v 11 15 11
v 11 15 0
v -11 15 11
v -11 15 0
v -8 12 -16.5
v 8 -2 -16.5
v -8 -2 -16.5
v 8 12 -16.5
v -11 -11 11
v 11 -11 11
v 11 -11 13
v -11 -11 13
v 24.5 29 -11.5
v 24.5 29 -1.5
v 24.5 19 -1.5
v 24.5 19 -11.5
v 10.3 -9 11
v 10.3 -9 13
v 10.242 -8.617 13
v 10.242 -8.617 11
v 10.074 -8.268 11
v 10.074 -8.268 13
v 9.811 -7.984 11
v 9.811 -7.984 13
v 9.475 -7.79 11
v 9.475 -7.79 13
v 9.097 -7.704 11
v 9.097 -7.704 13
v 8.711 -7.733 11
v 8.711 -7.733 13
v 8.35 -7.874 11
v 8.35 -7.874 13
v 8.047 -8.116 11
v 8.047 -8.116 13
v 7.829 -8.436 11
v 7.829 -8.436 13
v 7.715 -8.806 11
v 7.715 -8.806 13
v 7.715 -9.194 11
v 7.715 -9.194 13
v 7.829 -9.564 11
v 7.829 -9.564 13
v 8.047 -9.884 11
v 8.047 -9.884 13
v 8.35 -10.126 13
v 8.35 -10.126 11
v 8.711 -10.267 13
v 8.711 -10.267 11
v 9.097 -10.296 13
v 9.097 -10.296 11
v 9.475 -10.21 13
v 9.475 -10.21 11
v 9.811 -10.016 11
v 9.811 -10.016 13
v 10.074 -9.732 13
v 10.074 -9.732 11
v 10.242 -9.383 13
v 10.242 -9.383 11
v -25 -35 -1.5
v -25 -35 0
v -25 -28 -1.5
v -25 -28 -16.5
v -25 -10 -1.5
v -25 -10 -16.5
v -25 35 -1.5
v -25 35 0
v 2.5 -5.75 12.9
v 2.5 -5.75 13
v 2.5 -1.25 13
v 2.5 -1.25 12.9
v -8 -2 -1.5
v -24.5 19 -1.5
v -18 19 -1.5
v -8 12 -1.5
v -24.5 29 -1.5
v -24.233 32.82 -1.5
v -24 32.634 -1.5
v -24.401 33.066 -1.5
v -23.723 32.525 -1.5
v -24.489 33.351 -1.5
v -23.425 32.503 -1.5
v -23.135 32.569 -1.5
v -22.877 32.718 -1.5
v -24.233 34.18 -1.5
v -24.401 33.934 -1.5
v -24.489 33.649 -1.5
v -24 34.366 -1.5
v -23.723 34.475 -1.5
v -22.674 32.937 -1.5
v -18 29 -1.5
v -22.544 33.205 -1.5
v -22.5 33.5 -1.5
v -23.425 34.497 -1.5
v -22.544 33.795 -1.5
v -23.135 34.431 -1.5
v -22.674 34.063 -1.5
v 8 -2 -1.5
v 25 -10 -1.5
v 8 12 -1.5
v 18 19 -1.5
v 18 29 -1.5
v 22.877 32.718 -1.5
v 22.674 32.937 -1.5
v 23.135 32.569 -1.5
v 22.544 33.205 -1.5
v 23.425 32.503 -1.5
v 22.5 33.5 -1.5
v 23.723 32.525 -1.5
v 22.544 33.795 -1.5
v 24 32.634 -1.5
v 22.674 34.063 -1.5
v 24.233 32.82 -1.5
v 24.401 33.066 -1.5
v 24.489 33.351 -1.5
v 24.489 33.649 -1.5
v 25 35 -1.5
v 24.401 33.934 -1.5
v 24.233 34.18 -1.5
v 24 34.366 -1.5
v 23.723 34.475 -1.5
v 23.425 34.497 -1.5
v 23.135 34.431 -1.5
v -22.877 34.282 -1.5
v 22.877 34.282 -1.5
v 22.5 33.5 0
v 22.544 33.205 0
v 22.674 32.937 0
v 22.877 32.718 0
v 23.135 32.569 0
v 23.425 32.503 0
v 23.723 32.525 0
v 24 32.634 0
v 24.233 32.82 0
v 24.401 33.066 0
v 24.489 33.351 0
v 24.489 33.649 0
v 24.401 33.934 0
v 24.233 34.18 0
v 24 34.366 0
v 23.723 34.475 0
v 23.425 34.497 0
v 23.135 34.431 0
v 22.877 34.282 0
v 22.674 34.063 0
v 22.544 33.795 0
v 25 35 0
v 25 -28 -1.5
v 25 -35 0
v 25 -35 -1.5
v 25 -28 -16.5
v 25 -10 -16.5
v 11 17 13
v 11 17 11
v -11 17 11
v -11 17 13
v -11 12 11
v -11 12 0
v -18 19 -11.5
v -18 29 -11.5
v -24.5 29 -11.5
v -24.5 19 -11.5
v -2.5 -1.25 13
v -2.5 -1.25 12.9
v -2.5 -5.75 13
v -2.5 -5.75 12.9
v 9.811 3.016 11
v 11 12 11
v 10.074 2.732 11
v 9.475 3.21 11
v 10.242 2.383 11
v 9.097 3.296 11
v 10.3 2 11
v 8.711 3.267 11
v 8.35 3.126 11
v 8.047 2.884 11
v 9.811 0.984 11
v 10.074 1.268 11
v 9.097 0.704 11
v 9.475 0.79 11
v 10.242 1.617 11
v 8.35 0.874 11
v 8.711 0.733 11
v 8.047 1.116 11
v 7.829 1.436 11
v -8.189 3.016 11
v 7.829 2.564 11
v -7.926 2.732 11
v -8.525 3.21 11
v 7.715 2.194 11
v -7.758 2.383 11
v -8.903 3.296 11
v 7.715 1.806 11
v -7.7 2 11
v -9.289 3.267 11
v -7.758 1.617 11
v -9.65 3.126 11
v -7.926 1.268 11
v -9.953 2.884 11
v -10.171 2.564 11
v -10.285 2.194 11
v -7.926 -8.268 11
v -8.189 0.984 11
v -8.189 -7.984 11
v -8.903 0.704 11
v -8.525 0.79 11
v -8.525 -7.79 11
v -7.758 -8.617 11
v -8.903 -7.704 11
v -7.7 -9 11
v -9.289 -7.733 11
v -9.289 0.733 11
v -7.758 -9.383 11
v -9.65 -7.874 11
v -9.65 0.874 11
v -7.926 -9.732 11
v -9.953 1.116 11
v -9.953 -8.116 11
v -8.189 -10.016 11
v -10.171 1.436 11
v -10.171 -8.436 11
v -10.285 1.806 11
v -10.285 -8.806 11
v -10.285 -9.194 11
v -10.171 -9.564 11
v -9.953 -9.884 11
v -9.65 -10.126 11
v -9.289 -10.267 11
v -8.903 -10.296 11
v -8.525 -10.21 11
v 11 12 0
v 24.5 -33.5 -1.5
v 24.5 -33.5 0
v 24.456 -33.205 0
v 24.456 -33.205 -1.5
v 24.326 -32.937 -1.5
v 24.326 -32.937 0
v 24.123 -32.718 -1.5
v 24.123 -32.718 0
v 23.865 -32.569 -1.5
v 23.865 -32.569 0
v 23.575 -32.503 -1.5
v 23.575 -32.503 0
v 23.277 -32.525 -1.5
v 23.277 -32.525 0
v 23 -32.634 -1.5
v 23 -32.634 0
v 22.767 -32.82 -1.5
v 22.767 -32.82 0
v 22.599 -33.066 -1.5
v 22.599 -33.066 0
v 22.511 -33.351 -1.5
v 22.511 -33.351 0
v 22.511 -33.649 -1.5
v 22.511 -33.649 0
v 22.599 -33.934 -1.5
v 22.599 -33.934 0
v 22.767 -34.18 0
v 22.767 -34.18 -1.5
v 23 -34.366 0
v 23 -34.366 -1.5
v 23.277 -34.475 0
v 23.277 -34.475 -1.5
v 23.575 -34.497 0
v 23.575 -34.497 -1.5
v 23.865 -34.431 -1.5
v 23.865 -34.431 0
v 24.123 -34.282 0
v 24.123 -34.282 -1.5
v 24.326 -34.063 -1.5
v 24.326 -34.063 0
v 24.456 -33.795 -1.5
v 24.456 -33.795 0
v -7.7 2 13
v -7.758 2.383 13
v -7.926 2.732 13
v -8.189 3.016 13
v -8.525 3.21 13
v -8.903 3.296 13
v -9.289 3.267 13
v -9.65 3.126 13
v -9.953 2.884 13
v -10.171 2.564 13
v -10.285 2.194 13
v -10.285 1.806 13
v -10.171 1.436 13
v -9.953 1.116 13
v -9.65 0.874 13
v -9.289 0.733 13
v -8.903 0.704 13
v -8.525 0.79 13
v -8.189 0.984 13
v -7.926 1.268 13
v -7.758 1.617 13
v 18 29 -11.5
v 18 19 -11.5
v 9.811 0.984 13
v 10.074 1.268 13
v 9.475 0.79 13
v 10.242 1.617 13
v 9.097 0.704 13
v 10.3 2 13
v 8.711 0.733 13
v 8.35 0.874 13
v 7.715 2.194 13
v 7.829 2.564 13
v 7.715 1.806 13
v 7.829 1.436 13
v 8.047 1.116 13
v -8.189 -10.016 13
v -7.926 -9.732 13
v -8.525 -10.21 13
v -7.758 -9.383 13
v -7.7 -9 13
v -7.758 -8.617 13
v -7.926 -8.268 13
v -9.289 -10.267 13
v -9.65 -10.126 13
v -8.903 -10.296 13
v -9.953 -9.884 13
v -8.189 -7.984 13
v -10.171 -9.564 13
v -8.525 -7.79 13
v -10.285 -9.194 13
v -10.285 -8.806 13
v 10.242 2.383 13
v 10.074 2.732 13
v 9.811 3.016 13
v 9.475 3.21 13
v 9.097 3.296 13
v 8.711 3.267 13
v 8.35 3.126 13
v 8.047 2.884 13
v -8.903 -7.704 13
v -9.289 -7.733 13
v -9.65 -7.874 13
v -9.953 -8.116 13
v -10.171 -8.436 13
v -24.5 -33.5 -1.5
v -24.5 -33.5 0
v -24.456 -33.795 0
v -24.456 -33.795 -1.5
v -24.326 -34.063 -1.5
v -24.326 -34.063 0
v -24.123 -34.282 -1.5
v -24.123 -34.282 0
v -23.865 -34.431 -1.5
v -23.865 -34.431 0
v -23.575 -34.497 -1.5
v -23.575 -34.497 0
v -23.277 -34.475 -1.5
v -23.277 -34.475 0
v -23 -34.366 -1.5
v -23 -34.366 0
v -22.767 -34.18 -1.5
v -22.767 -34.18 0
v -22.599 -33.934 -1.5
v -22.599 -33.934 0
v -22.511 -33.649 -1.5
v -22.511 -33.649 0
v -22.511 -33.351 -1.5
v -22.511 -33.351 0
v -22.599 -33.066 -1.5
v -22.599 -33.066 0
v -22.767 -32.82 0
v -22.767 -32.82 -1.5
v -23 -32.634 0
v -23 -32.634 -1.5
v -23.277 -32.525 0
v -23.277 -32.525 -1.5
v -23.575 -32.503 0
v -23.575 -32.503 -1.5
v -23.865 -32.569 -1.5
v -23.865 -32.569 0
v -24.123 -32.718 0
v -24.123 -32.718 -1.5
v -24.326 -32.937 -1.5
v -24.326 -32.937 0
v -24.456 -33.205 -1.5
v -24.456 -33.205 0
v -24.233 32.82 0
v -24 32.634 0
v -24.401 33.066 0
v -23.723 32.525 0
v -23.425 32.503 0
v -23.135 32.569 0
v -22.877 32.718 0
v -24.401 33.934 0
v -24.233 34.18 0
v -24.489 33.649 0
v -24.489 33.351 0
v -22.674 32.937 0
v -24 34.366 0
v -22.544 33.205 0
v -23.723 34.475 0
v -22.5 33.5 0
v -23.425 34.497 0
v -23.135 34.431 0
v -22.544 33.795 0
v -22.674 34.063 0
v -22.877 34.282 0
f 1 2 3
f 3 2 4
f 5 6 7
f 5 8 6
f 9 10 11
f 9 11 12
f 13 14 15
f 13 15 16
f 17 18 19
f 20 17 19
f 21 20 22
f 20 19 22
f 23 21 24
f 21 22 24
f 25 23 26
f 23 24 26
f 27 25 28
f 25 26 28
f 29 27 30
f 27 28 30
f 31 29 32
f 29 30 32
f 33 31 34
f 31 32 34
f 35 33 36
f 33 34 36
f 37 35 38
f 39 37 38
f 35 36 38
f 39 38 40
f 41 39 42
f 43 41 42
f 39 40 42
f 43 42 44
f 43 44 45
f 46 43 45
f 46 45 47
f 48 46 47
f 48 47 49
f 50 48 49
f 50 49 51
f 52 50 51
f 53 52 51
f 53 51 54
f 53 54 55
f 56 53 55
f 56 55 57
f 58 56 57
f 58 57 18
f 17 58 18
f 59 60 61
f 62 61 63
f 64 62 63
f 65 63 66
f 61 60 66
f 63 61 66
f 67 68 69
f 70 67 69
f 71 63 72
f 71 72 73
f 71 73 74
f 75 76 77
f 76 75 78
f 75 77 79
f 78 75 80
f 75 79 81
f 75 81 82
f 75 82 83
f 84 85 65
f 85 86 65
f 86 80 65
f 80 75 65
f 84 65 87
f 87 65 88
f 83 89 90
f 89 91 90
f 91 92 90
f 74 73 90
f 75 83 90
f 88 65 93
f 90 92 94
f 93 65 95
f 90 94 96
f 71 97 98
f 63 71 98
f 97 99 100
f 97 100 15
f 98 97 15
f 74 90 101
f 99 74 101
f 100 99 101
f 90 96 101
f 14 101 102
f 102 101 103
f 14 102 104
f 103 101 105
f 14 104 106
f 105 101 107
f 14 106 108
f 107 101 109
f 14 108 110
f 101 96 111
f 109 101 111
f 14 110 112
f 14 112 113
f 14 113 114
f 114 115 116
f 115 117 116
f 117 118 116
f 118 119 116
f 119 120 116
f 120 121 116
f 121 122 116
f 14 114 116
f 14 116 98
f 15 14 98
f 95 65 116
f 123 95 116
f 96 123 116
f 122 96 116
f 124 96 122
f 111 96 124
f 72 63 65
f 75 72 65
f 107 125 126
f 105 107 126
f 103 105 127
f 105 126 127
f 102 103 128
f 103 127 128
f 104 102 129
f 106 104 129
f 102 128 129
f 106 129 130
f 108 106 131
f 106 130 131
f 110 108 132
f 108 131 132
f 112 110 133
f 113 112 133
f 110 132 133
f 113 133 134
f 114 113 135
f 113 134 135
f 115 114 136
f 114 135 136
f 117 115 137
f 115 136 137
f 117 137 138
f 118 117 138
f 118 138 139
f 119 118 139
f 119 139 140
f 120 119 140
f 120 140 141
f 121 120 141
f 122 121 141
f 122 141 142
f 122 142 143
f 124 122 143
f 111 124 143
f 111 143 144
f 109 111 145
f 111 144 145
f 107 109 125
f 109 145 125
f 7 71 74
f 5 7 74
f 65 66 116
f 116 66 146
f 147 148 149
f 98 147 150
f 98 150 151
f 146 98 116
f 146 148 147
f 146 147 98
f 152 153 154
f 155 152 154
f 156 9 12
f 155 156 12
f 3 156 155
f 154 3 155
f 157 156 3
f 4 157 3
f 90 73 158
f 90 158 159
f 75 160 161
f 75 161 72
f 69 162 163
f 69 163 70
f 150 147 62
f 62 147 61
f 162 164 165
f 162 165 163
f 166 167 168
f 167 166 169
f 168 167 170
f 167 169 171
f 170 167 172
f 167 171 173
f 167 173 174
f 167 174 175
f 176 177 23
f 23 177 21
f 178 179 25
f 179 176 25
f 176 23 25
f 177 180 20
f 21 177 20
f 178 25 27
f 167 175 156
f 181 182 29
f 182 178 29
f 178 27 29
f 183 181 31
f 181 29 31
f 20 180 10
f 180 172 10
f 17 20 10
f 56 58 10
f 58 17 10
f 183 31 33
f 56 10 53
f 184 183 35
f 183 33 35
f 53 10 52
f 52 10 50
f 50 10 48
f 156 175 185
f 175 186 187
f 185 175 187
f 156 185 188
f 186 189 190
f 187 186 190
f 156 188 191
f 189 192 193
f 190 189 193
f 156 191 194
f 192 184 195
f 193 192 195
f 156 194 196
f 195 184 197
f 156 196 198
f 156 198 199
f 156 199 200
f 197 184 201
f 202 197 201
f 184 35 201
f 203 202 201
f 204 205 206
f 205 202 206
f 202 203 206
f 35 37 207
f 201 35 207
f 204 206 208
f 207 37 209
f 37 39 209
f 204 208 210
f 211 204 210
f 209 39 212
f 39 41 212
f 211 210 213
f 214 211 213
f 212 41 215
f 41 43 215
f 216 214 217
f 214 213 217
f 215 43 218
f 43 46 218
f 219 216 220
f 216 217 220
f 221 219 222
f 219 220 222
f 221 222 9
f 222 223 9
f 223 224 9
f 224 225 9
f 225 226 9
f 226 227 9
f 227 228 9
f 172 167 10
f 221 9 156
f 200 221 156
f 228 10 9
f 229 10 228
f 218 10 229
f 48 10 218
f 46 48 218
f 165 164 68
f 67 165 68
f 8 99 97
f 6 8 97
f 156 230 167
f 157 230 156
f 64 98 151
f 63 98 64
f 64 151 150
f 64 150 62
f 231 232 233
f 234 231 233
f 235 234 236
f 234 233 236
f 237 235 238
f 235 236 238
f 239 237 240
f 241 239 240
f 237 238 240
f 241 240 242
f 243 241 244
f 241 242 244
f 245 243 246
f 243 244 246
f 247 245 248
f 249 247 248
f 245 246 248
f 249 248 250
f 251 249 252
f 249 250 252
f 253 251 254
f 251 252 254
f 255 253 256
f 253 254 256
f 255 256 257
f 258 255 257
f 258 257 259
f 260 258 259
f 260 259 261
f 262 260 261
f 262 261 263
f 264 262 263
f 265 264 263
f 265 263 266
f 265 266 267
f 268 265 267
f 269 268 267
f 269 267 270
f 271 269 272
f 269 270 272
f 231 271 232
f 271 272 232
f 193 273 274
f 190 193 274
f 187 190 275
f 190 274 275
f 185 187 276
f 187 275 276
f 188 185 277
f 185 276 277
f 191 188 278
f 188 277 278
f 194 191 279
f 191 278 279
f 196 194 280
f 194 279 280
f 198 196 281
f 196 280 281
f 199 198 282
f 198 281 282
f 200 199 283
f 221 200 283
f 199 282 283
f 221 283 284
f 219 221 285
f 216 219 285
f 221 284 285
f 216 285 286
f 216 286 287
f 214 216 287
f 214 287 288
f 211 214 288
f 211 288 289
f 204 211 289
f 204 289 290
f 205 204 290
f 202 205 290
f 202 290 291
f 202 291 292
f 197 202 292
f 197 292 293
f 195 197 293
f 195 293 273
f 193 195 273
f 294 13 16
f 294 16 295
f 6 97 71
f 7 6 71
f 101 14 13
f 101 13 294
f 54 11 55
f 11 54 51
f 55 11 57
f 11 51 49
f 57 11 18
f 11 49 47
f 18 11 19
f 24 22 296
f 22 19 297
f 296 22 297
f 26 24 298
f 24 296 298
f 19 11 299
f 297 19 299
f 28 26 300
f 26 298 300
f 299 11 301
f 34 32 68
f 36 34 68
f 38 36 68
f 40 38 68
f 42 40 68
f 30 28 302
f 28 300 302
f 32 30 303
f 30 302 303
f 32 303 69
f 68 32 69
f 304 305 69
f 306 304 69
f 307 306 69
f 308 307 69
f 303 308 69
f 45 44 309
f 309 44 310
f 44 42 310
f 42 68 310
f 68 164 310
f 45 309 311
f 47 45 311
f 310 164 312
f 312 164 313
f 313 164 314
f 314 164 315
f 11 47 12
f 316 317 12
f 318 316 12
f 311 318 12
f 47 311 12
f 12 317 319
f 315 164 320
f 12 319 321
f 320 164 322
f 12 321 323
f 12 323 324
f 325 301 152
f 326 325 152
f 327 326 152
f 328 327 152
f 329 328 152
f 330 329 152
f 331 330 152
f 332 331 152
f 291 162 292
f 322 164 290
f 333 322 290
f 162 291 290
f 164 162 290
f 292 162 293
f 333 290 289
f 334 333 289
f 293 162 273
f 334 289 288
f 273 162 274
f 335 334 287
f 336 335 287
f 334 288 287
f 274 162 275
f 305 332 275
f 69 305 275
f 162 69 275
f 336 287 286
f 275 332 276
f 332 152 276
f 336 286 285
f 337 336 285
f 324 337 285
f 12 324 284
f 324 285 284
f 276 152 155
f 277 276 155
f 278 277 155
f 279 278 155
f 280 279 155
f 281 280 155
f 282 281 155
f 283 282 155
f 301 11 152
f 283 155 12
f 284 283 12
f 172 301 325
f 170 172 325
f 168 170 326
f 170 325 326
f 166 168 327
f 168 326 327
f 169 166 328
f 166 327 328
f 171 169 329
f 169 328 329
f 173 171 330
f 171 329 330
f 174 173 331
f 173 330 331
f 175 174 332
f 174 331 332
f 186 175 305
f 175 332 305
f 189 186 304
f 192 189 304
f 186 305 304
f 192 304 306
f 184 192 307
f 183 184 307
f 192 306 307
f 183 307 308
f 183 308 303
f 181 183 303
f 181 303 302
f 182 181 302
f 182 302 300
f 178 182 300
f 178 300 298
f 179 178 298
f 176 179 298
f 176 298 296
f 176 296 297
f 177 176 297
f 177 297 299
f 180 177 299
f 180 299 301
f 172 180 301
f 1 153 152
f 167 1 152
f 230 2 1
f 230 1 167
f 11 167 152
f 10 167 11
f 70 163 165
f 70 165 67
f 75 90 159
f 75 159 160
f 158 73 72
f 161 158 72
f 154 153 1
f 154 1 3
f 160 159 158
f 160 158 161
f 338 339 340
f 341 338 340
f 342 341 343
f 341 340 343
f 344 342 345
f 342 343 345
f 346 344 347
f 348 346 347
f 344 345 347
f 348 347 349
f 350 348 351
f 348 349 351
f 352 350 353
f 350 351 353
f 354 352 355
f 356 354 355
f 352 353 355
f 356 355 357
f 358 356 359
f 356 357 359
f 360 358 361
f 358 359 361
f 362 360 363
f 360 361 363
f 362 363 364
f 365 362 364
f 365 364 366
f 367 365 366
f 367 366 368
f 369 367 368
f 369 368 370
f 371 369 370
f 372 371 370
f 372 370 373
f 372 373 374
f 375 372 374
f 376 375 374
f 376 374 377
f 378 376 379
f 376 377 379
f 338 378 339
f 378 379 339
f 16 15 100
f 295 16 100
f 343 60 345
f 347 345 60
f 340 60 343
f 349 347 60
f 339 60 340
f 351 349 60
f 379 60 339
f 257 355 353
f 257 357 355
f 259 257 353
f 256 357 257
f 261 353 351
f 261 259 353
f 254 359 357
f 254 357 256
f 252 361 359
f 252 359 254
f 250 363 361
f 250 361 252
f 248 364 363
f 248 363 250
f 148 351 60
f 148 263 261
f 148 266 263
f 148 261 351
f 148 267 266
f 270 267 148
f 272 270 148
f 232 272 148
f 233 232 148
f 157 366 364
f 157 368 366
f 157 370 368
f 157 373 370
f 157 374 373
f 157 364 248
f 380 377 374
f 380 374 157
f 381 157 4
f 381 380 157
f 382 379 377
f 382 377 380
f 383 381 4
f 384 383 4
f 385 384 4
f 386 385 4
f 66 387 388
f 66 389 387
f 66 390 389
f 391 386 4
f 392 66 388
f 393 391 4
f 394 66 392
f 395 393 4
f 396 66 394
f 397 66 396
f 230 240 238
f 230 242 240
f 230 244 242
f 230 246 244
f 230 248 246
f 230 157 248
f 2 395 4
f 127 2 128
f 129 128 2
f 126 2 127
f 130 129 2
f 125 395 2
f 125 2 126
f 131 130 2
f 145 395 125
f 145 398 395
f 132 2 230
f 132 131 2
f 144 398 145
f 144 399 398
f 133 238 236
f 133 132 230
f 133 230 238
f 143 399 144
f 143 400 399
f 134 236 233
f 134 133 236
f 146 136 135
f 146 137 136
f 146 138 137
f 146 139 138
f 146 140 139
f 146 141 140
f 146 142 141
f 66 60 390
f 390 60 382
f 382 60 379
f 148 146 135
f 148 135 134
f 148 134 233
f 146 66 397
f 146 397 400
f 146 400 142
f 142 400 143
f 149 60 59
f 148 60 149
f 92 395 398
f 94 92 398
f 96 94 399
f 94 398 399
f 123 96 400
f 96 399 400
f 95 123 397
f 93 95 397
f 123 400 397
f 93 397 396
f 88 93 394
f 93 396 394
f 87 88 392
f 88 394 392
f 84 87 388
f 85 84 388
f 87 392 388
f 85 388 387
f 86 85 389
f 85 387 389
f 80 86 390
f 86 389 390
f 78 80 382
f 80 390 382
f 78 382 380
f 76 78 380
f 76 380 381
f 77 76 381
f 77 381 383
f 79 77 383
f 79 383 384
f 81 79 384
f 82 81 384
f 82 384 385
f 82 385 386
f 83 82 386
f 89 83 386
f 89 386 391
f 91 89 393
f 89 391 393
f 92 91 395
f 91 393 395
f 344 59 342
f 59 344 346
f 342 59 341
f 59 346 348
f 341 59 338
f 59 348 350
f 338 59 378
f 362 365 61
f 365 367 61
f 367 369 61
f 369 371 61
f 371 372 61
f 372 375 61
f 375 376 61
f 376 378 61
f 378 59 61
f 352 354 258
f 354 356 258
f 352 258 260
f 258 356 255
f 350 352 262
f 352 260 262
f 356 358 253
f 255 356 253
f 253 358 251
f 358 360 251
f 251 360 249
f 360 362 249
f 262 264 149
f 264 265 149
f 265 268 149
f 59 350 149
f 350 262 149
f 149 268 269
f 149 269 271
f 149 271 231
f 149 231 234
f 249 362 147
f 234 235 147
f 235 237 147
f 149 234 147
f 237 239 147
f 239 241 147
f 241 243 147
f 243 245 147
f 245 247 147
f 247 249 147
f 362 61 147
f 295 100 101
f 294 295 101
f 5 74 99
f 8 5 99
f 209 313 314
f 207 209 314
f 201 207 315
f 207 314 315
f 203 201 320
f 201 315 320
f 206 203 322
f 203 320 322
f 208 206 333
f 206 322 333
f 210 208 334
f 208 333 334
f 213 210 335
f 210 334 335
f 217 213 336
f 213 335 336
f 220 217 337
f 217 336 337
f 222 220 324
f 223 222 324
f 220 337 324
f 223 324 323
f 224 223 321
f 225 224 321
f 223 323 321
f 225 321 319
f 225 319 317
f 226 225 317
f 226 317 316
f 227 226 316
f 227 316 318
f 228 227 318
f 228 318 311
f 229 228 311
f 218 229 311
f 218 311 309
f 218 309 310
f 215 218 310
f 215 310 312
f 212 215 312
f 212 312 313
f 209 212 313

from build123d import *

# Parameters (mm, degrees)
SKETCH_1_W          = 50
SKETCH_1_H          = 70
EXTRUDE_1_DEPTH     = 1.5
SKETCH_2_R          = 1
CUT_EXTRUDE_1_DEPTH = 1.5
SKETCH_3_W          = 50
SKETCH_3_H          = 18
EXTRUDE_2_DEPTH     = 15
EXTRUDE_3_DEPTH     = 15
SKETCH_5_W          = 7
SKETCH_5_H          = 10
EXTRUDE_4_DEPTH     = 10
EXTRUDE_5_DEPTH     = 13
SKETCH_7_W          = 22
SKETCH_7_H          = 11
CUT_EXTRUDE_2_DEPTH = 23
CUT_EXTRUDE_3_DEPTH = 2
SKETCH_9_W          = 10
SKETCH_9_H          = 10
CUT_EXTRUDE_4_DEPTH = 0.5
SKETCH_10_W         = 10
SKETCH_10_H         = 10
CUT_EXTRUDE_5_DEPTH = 0.5
CUT_EXTRUDE_6_REACH = 54.156
SKETCH_11_R         = 1.3
SKETCH_12_W         = 5
SKETCH_12_H         = 4.5
CUT_EXTRUDE_8_DEPTH = 0.1


with BuildPart() as part:
    # 草图1 → 凸台-拉伸1 (new body)
    with BuildSketch(Plane.XY):
        Rectangle(SKETCH_1_W, SKETCH_1_H)
    extrude(amount=-EXTRUDE_1_DEPTH)

    # 草图2 → 切除-拉伸1 (cut)
    with BuildSketch(Plane.XY):
        with Locations((-23.5, 33.5)):
            Circle(SKETCH_2_R)
        with Locations(Location((23.5, 33.5, 0), (0, 0, 180))):
            Circle(SKETCH_2_R)
        with Locations((23.5, -33.5)):
            Circle(SKETCH_2_R)
        with Locations(Location((-23.5, -33.5, 0), (0, 0, 180))):
            Circle(SKETCH_2_R)
    extrude(amount=-CUT_EXTRUDE_1_DEPTH, mode=Mode.SUBTRACT)

    # 草图3 → 凸台-拉伸2 (add)
    with BuildSketch(Plane(origin=(0, 0, -1.5), x_dir=(-1, 0, 0), z_dir=(0, 0, -1))):
        with Locations((0, -19)):
            Rectangle(SKETCH_3_W, SKETCH_3_H)
    extrude(amount=EXTRUDE_2_DEPTH)

    # 草图4 → 凸台-拉伸3 (add)
    with BuildSketch(Plane(origin=(0, 0, -1.5), x_dir=(-1, 0, 0), z_dir=(0, 0, -1))):
        Polygon((-8, -2), (0, -2), (8, -2), (8, 12), (-8, 12), align=None)
    extrude(amount=EXTRUDE_3_DEPTH)

    # 草图5 → 凸台-拉伸4 (add)
    with BuildSketch(Plane(origin=(0, 0, -1.5), x_dir=(-1, 0, 0), z_dir=(0, 0, -1))):
        with Locations((-21.5, 24)):
            Rectangle(SKETCH_5_W, SKETCH_5_H)
        with Locations((21.5, 24)):
            Rectangle(SKETCH_5_W, SKETCH_5_H)
    extrude(amount=EXTRUDE_4_DEPTH)

    # 草图6 → 凸台-拉伸5 (add)
    with BuildSketch(Plane.XY):
        Polygon((0, 17), (11, 17), (11, -11), (-11, -11), (-11, 17), align=None)
    extrude(amount=EXTRUDE_5_DEPTH)

    # 草图7 → 切除-拉伸2 (cut)
    with BuildSketch(Plane(origin=(0, -11, 0), x_dir=(-1, 0, 0), z_dir=(0, -1, 0))):
        with Locations((0, -5.5)):
            Rectangle(SKETCH_7_W, SKETCH_7_H)
    extrude(amount=-CUT_EXTRUDE_2_DEPTH, mode=Mode.SUBTRACT)

    # 草图8 → 切除-拉伸3 (cut)
    with BuildSketch(Plane(origin=(0, 17, 0), x_dir=(1, 0, 0), z_dir=(0, 1, 0))):
        Polygon((0, 0), (11, 0), (11, -11), (-11, -11), (-11, 0), align=None)
    extrude(amount=-CUT_EXTRUDE_3_DEPTH, mode=Mode.SUBTRACT)

    # 草图9 → 切除-拉伸4 (cut)
    with BuildSketch(Plane.ZY.offset(25)):
        with Locations((-6.5, 24)):
            Rectangle(SKETCH_9_W, SKETCH_9_H)
    extrude(amount=-CUT_EXTRUDE_4_DEPTH, mode=Mode.SUBTRACT)

    # 草图10 → 切除-拉伸5 (cut)
    with BuildSketch(Plane(origin=(25, 0, 0), x_dir=(0, 0, -1), z_dir=(1, 0, 0))):
        with Locations((6.5, 24)):
            Rectangle(SKETCH_10_W, SKETCH_10_H)
    extrude(amount=-CUT_EXTRUDE_5_DEPTH, mode=Mode.SUBTRACT)

    # 草图11 → 切除-拉伸6 (cut, up to next)
    with BuildSketch(Plane.XY.offset(13), mode=Mode.PRIVATE) as cut_extrude_6_sk1:
        with Locations((-9, 2)):
            Circle(SKETCH_11_R)
    cut_extrude_6_tool1 = extrude(cut_extrude_6_sk1.sketch, amount=-CUT_EXTRUDE_6_REACH, mode=Mode.PRIVATE) & part.part
    # 草图11 → 切除-拉伸6 (cut, up to next)
    with BuildSketch(Plane.XY.offset(13), mode=Mode.PRIVATE) as cut_extrude_6_sk2:
        with Locations((-9, -9)):
            Circle(SKETCH_11_R)
    cut_extrude_6_tool2 = extrude(cut_extrude_6_sk2.sketch, amount=-CUT_EXTRUDE_6_REACH, mode=Mode.PRIVATE) & part.part
    # 草图11 → 切除-拉伸6 (cut, up to next)
    with BuildSketch(Plane.XY.offset(13), mode=Mode.PRIVATE) as cut_extrude_6_sk3:
        with Locations((9, 2)):
            Circle(SKETCH_11_R)
    cut_extrude_6_tool3 = extrude(cut_extrude_6_sk3.sketch, amount=-CUT_EXTRUDE_6_REACH, mode=Mode.PRIVATE) & part.part
    # 草图11 → 切除-拉伸6 (cut, up to next)
    with BuildSketch(Plane.XY.offset(13), mode=Mode.PRIVATE) as cut_extrude_6_sk4:
        with Locations((9, -9)):
            Circle(SKETCH_11_R)
    cut_extrude_6_tool4 = extrude(cut_extrude_6_sk4.sketch, amount=-CUT_EXTRUDE_6_REACH, mode=Mode.PRIVATE) & part.part
    add(cut_extrude_6_tool1.solids().sort_by_distance((-9, 2, 13))[0], mode=Mode.SUBTRACT)
    add(cut_extrude_6_tool2.solids().sort_by_distance((-9, -9, 13))[0], mode=Mode.SUBTRACT)
    add(cut_extrude_6_tool3.solids().sort_by_distance((9, 2, 13))[0], mode=Mode.SUBTRACT)
    add(cut_extrude_6_tool4.solids().sort_by_distance((9, -9, 13))[0], mode=Mode.SUBTRACT)

    # 草图12 → 切除-拉伸8 (cut)
    with BuildSketch(Plane.XY.offset(13)):
        with Locations((0, -3.5)):
            Rectangle(SKETCH_12_W, SKETCH_12_H)
    extrude(amount=-CUT_EXTRUDE_8_DEPTH, mode=Mode.SUBTRACT)


solid = part.part
